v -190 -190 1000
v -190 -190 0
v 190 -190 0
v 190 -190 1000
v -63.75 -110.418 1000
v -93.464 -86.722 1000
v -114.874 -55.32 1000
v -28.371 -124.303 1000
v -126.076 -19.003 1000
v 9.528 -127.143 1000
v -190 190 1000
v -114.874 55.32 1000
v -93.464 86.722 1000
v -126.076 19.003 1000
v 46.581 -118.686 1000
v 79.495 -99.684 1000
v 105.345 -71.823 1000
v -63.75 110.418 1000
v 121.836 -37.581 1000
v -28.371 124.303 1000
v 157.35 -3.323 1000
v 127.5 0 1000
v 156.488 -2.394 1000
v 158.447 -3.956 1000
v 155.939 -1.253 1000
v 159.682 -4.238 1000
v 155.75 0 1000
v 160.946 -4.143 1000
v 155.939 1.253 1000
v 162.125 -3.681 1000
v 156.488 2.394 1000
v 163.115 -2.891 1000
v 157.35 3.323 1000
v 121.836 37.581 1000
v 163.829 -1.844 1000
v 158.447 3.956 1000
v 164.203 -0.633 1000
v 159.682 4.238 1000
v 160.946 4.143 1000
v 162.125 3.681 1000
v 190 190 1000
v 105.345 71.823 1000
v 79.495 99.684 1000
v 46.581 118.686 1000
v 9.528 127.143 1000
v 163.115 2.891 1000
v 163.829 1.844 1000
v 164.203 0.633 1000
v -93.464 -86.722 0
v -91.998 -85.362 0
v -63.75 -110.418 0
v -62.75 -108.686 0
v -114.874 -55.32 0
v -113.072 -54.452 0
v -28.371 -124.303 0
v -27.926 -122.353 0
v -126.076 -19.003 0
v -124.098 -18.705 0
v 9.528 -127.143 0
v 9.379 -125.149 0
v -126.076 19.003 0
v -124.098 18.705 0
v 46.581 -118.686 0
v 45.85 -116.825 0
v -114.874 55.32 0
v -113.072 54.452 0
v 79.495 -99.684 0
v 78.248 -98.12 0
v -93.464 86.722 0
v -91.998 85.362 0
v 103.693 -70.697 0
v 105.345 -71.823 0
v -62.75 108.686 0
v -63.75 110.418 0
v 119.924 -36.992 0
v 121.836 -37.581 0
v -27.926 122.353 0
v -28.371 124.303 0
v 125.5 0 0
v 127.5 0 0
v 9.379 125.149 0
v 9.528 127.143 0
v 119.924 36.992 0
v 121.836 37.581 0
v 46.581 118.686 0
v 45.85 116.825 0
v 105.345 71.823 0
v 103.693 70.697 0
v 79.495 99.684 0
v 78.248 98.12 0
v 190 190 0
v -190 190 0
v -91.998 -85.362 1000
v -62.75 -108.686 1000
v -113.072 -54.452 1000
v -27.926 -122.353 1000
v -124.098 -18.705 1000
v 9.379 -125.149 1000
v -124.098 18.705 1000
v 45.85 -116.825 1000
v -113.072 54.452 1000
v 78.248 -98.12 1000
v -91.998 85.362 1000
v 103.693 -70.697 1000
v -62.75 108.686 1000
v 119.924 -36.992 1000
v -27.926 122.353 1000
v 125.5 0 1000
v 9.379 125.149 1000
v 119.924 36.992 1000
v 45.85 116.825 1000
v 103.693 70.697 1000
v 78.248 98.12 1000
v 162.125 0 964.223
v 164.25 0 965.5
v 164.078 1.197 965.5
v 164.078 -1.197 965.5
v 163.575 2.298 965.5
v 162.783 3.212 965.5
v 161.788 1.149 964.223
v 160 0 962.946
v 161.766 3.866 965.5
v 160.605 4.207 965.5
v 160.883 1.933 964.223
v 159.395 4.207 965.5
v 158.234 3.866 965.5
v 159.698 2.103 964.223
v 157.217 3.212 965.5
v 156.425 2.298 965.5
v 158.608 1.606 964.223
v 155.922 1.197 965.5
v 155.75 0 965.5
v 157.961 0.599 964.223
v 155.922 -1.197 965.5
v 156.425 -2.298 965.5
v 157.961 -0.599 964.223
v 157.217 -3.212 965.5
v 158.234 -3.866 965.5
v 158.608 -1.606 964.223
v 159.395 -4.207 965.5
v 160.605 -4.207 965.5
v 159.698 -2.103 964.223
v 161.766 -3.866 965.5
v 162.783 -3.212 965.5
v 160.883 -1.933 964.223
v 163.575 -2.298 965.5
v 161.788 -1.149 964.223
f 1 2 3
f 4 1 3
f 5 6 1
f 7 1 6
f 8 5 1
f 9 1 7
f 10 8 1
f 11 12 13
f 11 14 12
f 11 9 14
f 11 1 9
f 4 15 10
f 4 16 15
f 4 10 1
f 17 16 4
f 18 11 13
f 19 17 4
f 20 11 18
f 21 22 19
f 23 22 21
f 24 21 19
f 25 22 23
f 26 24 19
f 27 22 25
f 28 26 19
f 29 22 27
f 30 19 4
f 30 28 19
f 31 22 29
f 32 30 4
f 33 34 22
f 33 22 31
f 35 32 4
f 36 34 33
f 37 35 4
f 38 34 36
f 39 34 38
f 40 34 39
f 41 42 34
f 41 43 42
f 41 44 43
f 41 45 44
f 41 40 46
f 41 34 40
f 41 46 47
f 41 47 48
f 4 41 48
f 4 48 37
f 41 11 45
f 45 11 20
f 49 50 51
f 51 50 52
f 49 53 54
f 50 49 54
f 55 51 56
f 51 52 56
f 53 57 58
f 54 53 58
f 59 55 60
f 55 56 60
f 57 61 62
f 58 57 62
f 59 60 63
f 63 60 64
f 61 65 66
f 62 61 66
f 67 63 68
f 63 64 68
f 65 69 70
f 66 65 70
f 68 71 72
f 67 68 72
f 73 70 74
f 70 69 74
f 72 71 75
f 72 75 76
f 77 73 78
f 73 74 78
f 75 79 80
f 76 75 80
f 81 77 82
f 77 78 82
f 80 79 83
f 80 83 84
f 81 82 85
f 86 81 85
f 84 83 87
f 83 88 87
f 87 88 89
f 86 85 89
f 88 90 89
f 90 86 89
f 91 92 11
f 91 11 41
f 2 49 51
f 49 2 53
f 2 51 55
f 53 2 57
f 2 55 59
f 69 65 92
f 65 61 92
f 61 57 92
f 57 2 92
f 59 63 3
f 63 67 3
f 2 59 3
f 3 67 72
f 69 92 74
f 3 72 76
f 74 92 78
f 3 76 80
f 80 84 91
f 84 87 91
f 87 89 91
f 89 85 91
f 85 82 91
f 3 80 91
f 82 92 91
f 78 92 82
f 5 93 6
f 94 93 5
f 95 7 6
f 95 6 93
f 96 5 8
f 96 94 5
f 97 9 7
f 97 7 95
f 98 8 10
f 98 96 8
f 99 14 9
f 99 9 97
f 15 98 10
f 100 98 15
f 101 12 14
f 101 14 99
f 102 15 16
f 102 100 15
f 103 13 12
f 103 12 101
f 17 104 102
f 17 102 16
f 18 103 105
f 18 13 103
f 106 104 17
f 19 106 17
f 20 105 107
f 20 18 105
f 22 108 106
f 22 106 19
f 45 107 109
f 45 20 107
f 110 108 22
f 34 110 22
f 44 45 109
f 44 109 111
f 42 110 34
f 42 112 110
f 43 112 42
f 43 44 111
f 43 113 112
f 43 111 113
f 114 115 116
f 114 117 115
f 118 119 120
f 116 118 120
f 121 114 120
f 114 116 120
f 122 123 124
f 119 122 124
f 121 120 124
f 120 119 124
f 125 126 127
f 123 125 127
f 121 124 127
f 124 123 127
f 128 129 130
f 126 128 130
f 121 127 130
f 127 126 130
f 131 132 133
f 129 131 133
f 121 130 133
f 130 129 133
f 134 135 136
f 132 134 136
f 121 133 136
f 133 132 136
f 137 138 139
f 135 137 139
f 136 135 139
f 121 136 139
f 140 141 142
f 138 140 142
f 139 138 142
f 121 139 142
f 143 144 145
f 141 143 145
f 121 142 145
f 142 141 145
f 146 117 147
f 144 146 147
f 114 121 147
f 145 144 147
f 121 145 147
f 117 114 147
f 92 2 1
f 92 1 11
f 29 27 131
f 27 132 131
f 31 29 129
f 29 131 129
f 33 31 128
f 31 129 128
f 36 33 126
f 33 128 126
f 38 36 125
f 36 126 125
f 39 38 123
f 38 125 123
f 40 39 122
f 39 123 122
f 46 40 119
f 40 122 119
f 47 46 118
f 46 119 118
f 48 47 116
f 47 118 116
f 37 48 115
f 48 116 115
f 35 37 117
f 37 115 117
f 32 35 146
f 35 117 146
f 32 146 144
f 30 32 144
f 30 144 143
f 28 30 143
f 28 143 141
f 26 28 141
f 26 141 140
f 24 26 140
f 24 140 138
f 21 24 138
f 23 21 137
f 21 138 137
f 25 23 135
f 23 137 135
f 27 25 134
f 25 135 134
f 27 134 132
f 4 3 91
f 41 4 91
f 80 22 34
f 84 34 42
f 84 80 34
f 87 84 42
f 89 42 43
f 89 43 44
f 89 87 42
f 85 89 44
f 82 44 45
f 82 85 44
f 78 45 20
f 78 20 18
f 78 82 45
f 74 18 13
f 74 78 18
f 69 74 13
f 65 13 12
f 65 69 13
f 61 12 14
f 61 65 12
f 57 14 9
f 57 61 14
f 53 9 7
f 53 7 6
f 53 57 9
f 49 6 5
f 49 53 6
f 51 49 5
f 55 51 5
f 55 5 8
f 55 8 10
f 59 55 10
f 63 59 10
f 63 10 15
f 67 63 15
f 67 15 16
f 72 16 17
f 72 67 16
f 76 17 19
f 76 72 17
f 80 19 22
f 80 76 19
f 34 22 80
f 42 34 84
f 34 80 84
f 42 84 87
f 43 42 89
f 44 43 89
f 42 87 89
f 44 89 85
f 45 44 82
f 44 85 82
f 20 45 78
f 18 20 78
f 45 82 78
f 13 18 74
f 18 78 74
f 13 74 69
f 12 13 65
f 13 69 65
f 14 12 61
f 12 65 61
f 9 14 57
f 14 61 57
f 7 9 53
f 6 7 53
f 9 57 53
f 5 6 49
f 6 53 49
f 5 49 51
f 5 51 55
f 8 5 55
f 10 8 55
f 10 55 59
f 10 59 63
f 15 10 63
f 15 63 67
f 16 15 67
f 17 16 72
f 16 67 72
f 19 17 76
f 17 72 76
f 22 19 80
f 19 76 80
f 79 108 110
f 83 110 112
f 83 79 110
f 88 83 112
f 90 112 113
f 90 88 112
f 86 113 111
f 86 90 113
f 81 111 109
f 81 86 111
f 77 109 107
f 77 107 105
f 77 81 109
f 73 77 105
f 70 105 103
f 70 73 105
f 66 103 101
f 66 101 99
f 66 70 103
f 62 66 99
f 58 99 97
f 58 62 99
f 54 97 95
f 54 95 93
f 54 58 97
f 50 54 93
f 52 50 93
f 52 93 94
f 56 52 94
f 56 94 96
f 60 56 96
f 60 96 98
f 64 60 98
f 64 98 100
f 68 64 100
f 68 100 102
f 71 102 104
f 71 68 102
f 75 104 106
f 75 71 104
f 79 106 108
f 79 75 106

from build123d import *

# Parameters (mm, degrees)
F0_W     = 380
F0_H     = 380
F0_R     = 127.5
F1_DEPTH = 1000
F3_D     = 8.5
F3_DEPTH = 34.5
F3_TIP   = 2.5536576309
F4_R     = 127.5
F4_R_2   = 125.5
F5_DEPTH = 1000


with BuildPart() as f1:
    # F0 (on Top) → F1 (new body)
    with BuildSketch(Plane.XY):
        Rectangle(F0_W, F0_H)
        Circle(F0_R, mode=Mode.SUBTRACT)
    extrude(amount=F1_DEPTH)

    # F3
    with Locations(Plane.XY.offset(1000)):
        with Locations((160, 0)):
            Hole(F3_D / 2, depth=F3_DEPTH)
            with Locations((0, 0, -(F3_DEPTH + F3_TIP / 2))):  # 118° drill point
                Cone(0, F3_D / 2, F3_TIP, mode=Mode.SUBTRACT)


with BuildPart() as f5:
    # F4 (on Top) → F5 (new body, through all)
    with BuildSketch(Plane.XY):
        Circle(F4_R)
        Circle(F4_R_2, mode=Mode.SUBTRACT)
    extrude(amount=F5_DEPTH)


solid = Compound([f1.part, f5.part])
